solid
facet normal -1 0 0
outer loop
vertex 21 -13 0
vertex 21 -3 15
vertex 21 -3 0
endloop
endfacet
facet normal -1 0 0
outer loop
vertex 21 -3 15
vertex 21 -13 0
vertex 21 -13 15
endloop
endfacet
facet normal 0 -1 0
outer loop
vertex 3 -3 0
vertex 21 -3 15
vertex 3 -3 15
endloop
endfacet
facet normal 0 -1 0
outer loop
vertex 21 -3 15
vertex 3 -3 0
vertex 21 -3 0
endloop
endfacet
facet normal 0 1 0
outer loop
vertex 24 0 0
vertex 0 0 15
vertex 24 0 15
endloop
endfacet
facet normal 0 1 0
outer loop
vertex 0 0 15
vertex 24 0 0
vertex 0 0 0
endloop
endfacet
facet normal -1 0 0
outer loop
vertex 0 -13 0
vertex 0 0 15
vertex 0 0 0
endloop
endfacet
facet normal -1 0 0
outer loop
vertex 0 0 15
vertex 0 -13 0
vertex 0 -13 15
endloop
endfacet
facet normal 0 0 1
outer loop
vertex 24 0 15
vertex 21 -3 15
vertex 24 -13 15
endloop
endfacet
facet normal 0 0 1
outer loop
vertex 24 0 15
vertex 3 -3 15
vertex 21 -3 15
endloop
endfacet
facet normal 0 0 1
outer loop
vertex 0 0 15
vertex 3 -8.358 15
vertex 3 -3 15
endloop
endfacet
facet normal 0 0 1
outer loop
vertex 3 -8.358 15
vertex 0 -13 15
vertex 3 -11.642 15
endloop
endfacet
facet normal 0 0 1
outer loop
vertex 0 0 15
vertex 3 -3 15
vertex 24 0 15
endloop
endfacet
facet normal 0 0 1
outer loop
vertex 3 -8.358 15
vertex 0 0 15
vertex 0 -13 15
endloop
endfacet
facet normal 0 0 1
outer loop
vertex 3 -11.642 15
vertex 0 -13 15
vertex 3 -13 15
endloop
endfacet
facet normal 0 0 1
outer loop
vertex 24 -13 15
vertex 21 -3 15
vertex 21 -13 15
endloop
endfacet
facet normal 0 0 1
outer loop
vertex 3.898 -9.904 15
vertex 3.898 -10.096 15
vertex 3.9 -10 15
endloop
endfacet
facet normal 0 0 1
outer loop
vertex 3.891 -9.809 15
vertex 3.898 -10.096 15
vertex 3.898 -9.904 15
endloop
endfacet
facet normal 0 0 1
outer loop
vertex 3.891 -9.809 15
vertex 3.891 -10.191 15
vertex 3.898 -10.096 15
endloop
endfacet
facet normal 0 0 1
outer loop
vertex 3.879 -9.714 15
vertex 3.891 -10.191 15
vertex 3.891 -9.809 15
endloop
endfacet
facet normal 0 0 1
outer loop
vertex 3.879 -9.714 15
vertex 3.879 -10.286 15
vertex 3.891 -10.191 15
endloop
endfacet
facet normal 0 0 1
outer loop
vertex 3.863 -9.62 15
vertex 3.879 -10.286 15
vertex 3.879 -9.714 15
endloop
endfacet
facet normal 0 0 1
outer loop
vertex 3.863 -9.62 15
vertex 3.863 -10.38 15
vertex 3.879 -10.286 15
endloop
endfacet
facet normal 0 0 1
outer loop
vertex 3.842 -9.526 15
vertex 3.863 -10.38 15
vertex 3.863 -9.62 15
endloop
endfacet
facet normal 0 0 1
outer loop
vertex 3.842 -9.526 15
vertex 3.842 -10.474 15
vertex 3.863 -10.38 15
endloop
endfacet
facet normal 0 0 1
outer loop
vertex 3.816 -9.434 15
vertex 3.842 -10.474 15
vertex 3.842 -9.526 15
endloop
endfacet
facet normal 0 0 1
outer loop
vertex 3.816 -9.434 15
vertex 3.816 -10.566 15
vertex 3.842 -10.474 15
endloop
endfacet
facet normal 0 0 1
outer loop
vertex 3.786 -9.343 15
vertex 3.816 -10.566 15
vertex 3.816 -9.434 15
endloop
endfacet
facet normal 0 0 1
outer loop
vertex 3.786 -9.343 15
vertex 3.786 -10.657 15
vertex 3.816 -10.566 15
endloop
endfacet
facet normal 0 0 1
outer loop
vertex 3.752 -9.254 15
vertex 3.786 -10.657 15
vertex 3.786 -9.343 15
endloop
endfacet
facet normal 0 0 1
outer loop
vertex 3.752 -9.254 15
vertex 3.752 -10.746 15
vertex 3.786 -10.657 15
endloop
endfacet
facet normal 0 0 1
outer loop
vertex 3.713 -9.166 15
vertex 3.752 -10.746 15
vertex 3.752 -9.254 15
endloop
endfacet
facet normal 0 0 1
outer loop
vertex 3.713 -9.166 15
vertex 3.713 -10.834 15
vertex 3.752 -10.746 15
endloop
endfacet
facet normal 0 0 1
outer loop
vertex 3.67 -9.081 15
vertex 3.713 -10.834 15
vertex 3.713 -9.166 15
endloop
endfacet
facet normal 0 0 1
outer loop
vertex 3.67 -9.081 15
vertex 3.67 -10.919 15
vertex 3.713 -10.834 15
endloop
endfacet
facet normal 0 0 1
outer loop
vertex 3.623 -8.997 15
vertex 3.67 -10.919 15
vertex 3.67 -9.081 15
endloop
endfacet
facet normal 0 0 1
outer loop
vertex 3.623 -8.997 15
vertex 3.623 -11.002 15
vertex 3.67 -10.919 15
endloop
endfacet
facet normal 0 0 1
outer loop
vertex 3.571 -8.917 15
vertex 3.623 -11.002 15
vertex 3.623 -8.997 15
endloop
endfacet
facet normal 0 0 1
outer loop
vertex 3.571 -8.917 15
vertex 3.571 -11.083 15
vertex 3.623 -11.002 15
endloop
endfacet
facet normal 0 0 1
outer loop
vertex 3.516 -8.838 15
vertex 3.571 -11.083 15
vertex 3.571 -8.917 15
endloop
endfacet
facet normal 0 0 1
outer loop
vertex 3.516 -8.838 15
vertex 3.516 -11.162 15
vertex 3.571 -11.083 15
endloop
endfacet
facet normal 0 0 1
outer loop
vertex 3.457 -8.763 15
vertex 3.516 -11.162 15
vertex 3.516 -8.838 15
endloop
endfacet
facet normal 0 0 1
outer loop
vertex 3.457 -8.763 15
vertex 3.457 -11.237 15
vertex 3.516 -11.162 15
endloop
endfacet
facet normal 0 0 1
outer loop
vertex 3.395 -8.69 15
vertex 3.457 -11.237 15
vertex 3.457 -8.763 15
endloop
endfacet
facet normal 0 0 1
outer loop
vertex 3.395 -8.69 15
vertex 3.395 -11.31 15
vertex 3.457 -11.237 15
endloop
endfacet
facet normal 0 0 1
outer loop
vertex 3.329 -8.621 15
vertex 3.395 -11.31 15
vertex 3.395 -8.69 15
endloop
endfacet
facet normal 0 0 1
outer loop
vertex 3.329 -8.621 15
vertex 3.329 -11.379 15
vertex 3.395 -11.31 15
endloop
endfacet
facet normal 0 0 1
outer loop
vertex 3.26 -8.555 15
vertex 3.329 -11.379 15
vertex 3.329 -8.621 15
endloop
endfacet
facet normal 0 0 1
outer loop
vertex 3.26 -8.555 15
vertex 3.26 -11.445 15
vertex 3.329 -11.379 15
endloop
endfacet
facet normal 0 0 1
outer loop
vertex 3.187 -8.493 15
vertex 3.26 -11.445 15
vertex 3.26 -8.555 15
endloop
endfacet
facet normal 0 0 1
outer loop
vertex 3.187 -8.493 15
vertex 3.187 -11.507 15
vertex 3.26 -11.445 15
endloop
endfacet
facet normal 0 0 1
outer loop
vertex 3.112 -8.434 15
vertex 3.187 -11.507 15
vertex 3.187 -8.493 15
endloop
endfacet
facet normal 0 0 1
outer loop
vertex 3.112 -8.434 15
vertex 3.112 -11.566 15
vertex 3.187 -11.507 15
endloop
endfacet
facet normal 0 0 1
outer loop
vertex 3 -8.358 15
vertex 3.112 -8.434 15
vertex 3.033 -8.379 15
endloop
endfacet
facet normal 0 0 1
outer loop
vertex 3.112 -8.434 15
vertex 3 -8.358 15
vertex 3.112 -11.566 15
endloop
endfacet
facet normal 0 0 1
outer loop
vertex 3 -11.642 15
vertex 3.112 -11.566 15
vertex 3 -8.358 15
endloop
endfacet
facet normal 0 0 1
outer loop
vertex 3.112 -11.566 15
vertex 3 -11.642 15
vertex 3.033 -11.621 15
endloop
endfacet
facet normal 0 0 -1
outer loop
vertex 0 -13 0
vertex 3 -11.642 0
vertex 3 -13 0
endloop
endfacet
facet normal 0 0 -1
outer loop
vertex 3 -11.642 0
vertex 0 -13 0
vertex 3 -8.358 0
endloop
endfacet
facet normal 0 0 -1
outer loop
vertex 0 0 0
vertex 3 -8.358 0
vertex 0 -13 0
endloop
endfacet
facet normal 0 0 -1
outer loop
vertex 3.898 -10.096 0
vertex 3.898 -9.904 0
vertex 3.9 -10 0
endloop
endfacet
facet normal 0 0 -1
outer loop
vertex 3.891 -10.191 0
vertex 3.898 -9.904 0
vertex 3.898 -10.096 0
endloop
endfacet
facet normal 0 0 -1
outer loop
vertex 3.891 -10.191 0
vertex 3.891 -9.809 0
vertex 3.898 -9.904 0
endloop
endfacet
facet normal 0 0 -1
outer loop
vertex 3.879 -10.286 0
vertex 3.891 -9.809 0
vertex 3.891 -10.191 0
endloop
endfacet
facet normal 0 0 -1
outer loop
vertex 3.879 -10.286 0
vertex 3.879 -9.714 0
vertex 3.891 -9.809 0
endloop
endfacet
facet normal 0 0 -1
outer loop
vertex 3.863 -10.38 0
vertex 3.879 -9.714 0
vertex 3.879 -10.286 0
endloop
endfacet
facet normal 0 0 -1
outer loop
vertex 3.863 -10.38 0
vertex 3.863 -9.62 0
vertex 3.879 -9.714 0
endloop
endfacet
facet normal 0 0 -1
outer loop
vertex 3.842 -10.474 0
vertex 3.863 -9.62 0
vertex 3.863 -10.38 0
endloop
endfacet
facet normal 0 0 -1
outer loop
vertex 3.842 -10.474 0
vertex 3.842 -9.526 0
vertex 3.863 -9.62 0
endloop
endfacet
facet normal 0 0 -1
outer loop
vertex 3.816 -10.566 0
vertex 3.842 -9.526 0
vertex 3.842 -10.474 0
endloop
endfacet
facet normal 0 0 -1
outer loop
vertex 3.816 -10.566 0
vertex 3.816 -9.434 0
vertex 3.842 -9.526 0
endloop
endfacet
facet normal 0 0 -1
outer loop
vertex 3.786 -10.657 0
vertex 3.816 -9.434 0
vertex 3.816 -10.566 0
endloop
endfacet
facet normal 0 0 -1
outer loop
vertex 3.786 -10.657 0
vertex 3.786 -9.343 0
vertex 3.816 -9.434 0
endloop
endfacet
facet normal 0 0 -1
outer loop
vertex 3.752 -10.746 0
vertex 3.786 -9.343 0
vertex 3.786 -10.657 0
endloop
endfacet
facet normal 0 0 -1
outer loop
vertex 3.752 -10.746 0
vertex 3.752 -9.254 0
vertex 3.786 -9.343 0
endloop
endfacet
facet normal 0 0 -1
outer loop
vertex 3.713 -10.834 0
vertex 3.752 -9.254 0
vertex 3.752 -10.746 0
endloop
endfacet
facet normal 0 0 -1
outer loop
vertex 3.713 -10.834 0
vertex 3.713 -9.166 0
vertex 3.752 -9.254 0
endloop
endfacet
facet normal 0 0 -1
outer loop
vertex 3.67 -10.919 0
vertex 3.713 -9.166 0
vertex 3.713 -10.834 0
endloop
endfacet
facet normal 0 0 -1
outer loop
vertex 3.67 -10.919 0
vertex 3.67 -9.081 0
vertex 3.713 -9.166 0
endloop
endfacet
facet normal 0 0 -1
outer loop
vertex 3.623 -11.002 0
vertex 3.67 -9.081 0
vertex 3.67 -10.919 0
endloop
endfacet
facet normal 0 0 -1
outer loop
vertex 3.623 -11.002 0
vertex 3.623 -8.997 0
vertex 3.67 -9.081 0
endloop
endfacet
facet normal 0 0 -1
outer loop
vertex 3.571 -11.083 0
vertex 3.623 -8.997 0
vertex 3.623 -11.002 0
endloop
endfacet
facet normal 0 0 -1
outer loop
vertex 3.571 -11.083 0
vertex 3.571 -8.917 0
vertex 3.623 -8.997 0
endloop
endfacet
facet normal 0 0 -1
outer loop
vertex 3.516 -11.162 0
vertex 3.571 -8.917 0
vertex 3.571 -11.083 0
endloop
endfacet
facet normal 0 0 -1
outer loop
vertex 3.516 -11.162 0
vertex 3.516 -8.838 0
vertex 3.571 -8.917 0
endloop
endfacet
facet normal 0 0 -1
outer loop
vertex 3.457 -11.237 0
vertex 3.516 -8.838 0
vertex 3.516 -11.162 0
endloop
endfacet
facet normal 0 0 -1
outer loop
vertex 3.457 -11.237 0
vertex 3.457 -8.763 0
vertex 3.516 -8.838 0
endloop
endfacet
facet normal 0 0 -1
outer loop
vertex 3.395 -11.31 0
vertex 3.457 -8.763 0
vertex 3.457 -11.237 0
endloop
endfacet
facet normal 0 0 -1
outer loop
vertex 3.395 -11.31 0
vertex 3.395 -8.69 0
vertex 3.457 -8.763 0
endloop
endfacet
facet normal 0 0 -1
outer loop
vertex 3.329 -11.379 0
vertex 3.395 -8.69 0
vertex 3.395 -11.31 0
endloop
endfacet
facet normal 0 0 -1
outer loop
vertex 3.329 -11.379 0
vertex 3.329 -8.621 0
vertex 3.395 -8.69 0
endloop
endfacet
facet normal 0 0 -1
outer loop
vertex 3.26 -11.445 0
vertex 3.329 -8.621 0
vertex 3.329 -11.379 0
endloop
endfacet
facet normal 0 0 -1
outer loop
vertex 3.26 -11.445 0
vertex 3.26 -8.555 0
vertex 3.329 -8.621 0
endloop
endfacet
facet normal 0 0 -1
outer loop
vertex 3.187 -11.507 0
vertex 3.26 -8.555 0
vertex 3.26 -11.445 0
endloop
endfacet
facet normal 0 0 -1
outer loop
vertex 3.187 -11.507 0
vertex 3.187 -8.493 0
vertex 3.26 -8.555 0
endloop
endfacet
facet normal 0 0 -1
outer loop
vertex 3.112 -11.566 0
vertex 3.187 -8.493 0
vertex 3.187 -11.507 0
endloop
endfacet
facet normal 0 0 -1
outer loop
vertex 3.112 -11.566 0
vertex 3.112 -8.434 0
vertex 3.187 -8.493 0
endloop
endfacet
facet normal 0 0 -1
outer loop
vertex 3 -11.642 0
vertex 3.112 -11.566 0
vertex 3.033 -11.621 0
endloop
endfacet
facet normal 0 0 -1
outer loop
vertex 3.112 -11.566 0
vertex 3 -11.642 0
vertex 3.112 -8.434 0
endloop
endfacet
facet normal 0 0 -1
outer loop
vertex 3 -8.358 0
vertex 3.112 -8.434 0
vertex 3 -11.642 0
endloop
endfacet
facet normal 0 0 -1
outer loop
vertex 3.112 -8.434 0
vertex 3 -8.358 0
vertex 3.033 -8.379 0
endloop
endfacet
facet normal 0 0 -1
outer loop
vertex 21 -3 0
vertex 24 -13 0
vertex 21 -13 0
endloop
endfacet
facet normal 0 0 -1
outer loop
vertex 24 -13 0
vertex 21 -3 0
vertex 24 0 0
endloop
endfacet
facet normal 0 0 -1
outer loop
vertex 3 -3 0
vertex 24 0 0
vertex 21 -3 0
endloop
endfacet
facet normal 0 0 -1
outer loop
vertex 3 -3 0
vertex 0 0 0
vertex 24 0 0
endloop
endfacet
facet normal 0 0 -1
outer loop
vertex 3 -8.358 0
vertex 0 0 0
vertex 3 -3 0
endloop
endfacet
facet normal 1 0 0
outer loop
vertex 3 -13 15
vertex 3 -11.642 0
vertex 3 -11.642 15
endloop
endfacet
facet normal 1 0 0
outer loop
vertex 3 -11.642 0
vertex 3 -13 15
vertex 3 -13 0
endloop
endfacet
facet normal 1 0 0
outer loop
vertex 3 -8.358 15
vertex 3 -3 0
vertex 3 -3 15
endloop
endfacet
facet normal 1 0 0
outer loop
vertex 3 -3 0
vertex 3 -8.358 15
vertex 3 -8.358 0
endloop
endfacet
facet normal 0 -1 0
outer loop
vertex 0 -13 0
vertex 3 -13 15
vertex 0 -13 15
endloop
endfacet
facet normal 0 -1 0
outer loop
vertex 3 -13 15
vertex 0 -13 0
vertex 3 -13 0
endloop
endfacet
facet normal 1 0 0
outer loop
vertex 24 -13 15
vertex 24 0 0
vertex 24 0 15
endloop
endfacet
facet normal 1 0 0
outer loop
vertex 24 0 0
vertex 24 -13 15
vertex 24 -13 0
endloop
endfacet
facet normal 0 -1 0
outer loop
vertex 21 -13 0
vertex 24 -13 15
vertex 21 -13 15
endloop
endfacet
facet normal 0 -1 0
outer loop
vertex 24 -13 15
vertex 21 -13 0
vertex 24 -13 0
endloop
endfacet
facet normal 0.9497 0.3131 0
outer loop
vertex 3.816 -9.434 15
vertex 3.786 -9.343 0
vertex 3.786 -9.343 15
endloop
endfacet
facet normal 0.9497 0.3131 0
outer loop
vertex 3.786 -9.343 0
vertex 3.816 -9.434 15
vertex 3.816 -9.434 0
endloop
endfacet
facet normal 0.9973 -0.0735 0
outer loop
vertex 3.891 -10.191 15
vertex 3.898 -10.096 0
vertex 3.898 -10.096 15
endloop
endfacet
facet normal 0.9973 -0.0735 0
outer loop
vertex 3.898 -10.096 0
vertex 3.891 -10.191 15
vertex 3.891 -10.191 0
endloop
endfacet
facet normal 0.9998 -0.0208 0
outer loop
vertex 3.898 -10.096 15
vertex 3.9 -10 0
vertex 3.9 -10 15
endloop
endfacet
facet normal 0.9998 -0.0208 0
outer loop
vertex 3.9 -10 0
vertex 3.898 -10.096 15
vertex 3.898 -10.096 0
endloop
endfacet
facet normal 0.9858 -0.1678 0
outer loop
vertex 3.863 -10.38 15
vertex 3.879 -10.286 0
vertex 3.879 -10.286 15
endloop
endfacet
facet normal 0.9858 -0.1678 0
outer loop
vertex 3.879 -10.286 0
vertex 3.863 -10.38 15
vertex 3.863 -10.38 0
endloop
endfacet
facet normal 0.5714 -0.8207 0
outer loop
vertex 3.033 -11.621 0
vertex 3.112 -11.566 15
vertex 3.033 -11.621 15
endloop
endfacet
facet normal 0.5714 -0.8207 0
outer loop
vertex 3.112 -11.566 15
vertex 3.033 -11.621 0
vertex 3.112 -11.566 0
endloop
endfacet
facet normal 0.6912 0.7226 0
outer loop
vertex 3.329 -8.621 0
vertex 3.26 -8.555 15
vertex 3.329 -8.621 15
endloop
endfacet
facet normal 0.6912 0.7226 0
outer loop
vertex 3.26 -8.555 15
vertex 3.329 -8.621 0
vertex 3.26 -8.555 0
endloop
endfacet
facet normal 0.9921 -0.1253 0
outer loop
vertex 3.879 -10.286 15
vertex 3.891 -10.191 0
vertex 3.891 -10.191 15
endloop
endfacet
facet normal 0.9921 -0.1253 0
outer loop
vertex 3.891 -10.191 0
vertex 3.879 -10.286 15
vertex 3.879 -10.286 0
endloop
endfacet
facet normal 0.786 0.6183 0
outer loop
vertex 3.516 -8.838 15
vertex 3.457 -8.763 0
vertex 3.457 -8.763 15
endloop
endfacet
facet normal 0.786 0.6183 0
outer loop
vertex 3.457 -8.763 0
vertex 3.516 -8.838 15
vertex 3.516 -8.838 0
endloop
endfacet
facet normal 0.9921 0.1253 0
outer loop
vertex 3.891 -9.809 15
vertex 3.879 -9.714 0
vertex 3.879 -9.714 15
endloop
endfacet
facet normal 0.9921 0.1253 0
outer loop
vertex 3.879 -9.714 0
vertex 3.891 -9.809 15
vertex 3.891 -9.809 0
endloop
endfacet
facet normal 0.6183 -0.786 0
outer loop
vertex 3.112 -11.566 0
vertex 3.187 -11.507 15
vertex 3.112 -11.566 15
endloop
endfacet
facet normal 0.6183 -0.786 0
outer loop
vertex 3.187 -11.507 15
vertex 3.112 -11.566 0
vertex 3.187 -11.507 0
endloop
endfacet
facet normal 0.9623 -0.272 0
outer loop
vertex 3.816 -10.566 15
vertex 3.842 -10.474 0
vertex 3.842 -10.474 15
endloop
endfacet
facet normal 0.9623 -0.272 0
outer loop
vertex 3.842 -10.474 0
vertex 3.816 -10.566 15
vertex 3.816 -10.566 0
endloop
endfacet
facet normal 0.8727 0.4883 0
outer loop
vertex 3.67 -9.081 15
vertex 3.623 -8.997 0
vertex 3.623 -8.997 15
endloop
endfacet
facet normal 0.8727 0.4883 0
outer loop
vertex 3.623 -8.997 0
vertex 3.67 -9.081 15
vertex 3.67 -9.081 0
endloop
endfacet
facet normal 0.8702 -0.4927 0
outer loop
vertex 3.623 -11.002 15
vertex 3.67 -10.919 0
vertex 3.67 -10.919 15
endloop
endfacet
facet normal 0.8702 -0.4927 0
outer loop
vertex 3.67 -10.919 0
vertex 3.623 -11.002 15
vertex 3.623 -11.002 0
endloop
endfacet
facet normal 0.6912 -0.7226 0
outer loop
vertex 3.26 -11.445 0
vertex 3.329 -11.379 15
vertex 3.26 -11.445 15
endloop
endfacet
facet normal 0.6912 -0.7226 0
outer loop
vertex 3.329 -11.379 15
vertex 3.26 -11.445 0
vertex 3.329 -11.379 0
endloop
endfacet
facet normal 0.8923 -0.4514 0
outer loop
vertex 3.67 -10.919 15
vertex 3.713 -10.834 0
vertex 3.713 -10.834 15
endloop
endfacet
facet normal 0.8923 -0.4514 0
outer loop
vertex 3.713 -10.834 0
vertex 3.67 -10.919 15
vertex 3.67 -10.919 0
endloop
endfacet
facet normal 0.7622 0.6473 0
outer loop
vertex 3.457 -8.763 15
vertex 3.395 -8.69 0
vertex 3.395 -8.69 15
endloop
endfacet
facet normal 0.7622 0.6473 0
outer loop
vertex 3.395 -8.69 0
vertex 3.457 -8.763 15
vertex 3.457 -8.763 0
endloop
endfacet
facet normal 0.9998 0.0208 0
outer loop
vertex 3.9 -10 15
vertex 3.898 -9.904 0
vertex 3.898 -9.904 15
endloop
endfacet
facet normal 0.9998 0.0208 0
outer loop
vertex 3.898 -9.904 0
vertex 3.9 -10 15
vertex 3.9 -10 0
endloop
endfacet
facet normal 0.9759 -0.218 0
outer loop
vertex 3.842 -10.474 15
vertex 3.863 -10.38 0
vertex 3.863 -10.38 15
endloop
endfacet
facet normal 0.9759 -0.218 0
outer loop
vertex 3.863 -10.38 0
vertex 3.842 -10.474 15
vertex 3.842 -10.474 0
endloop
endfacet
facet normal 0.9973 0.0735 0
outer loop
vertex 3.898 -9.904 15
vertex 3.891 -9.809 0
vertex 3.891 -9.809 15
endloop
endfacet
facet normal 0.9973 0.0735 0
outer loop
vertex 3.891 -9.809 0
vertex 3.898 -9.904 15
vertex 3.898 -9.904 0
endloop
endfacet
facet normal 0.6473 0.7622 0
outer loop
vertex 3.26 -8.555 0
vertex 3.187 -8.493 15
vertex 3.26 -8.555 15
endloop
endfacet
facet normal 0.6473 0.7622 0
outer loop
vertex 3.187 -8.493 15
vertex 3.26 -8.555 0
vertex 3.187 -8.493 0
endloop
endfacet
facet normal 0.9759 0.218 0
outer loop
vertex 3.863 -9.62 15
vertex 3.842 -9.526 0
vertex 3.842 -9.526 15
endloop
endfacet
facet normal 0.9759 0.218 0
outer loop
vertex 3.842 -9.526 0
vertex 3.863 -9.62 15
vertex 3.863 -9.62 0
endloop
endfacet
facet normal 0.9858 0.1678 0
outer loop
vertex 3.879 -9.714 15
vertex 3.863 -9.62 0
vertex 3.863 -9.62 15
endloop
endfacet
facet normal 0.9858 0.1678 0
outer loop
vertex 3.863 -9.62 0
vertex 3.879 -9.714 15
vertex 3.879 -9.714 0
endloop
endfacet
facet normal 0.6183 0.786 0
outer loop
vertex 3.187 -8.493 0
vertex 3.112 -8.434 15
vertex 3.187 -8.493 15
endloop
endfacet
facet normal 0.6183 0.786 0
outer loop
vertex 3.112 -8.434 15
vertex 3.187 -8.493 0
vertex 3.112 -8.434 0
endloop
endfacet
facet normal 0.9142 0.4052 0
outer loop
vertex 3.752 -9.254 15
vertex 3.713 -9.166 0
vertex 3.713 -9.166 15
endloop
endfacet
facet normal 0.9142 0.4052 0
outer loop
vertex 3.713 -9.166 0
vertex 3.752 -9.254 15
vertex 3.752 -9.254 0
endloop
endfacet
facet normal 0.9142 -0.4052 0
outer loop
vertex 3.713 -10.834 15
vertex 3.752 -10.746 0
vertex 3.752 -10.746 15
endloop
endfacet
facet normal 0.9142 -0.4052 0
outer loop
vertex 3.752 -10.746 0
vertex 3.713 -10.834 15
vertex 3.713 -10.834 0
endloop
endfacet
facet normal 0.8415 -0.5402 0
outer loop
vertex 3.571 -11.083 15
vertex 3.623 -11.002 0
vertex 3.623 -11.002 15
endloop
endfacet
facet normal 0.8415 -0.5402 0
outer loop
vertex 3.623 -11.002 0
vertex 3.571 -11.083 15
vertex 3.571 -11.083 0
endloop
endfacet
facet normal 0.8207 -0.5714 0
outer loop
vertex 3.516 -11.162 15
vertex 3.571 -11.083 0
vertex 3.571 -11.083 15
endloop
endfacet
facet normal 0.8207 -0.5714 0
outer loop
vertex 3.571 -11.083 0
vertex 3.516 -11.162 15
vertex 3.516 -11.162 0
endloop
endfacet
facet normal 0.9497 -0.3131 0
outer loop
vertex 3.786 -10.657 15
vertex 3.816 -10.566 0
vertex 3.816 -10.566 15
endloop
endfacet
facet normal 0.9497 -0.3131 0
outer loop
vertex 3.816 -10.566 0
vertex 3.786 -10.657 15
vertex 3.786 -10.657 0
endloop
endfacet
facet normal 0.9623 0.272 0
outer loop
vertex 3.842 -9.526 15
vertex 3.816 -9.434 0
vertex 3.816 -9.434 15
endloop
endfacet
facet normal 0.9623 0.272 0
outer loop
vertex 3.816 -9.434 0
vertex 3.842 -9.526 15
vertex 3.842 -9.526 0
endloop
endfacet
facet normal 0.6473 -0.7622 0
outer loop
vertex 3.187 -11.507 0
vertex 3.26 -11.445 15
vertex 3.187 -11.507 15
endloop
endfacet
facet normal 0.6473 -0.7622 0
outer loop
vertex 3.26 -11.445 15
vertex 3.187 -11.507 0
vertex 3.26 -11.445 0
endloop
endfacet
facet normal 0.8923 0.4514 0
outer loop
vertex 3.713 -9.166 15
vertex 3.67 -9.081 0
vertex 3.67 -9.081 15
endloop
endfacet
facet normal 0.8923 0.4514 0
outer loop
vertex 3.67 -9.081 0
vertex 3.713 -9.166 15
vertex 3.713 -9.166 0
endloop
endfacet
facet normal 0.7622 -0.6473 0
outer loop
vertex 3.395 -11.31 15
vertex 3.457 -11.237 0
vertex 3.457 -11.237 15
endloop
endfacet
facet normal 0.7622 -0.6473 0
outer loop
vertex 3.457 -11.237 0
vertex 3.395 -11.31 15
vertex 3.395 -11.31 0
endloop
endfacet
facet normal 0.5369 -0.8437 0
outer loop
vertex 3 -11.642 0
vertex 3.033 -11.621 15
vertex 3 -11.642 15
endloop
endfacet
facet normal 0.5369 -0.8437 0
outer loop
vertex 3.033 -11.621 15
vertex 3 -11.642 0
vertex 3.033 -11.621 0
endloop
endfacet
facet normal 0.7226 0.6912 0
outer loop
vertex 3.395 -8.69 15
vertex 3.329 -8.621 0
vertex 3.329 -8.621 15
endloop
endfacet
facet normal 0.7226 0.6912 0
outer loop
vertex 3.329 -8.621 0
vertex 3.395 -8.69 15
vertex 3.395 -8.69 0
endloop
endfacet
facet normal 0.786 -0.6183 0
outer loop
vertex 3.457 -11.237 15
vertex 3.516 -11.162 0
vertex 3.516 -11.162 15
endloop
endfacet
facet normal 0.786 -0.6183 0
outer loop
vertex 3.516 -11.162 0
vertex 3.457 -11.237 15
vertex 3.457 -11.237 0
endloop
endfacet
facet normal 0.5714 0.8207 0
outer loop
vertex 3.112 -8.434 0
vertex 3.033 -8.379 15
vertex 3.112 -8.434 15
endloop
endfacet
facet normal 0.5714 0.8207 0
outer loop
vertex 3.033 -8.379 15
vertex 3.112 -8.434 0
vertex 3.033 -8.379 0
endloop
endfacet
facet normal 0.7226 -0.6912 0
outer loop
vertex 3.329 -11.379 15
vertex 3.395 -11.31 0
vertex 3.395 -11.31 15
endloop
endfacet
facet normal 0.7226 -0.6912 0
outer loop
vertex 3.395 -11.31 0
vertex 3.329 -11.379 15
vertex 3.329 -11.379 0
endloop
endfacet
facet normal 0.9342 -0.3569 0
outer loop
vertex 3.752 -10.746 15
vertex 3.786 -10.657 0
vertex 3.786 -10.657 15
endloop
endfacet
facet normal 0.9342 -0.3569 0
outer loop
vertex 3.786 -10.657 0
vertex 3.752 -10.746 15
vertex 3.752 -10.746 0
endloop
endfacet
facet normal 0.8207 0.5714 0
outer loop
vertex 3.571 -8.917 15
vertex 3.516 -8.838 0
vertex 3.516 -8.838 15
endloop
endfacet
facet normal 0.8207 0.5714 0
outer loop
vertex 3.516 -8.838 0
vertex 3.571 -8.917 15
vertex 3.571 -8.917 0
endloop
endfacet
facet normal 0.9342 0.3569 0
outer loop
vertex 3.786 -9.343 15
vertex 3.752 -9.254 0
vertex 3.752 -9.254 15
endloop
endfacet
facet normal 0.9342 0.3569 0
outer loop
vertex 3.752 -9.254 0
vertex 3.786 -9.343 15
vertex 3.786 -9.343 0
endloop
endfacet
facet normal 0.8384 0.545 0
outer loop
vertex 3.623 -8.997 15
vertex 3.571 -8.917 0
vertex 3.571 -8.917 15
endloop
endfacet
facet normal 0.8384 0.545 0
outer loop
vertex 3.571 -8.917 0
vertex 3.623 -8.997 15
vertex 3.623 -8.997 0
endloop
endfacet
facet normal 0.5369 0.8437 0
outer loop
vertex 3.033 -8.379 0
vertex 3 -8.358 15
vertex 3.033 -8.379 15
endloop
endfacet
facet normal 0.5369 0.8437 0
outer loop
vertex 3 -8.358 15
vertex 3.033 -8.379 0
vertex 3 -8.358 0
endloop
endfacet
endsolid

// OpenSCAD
$fn=128;

thick=3;
width=18;
size=15;
depth=10;

rotate([90,0,0])
clamp();

module clamp(){
    union(){
        cube([width+thick,size,thick]);

        cube([thick,size,depth+thick]);
        translate([width+thick,0,0])
        cube([thick,size,depth+thick]);
    }

    d=thick*1.3;
    translate([d/2,size,depth])
    rotate([90,0,0])
    cylinder(h=size, d=d);
}
